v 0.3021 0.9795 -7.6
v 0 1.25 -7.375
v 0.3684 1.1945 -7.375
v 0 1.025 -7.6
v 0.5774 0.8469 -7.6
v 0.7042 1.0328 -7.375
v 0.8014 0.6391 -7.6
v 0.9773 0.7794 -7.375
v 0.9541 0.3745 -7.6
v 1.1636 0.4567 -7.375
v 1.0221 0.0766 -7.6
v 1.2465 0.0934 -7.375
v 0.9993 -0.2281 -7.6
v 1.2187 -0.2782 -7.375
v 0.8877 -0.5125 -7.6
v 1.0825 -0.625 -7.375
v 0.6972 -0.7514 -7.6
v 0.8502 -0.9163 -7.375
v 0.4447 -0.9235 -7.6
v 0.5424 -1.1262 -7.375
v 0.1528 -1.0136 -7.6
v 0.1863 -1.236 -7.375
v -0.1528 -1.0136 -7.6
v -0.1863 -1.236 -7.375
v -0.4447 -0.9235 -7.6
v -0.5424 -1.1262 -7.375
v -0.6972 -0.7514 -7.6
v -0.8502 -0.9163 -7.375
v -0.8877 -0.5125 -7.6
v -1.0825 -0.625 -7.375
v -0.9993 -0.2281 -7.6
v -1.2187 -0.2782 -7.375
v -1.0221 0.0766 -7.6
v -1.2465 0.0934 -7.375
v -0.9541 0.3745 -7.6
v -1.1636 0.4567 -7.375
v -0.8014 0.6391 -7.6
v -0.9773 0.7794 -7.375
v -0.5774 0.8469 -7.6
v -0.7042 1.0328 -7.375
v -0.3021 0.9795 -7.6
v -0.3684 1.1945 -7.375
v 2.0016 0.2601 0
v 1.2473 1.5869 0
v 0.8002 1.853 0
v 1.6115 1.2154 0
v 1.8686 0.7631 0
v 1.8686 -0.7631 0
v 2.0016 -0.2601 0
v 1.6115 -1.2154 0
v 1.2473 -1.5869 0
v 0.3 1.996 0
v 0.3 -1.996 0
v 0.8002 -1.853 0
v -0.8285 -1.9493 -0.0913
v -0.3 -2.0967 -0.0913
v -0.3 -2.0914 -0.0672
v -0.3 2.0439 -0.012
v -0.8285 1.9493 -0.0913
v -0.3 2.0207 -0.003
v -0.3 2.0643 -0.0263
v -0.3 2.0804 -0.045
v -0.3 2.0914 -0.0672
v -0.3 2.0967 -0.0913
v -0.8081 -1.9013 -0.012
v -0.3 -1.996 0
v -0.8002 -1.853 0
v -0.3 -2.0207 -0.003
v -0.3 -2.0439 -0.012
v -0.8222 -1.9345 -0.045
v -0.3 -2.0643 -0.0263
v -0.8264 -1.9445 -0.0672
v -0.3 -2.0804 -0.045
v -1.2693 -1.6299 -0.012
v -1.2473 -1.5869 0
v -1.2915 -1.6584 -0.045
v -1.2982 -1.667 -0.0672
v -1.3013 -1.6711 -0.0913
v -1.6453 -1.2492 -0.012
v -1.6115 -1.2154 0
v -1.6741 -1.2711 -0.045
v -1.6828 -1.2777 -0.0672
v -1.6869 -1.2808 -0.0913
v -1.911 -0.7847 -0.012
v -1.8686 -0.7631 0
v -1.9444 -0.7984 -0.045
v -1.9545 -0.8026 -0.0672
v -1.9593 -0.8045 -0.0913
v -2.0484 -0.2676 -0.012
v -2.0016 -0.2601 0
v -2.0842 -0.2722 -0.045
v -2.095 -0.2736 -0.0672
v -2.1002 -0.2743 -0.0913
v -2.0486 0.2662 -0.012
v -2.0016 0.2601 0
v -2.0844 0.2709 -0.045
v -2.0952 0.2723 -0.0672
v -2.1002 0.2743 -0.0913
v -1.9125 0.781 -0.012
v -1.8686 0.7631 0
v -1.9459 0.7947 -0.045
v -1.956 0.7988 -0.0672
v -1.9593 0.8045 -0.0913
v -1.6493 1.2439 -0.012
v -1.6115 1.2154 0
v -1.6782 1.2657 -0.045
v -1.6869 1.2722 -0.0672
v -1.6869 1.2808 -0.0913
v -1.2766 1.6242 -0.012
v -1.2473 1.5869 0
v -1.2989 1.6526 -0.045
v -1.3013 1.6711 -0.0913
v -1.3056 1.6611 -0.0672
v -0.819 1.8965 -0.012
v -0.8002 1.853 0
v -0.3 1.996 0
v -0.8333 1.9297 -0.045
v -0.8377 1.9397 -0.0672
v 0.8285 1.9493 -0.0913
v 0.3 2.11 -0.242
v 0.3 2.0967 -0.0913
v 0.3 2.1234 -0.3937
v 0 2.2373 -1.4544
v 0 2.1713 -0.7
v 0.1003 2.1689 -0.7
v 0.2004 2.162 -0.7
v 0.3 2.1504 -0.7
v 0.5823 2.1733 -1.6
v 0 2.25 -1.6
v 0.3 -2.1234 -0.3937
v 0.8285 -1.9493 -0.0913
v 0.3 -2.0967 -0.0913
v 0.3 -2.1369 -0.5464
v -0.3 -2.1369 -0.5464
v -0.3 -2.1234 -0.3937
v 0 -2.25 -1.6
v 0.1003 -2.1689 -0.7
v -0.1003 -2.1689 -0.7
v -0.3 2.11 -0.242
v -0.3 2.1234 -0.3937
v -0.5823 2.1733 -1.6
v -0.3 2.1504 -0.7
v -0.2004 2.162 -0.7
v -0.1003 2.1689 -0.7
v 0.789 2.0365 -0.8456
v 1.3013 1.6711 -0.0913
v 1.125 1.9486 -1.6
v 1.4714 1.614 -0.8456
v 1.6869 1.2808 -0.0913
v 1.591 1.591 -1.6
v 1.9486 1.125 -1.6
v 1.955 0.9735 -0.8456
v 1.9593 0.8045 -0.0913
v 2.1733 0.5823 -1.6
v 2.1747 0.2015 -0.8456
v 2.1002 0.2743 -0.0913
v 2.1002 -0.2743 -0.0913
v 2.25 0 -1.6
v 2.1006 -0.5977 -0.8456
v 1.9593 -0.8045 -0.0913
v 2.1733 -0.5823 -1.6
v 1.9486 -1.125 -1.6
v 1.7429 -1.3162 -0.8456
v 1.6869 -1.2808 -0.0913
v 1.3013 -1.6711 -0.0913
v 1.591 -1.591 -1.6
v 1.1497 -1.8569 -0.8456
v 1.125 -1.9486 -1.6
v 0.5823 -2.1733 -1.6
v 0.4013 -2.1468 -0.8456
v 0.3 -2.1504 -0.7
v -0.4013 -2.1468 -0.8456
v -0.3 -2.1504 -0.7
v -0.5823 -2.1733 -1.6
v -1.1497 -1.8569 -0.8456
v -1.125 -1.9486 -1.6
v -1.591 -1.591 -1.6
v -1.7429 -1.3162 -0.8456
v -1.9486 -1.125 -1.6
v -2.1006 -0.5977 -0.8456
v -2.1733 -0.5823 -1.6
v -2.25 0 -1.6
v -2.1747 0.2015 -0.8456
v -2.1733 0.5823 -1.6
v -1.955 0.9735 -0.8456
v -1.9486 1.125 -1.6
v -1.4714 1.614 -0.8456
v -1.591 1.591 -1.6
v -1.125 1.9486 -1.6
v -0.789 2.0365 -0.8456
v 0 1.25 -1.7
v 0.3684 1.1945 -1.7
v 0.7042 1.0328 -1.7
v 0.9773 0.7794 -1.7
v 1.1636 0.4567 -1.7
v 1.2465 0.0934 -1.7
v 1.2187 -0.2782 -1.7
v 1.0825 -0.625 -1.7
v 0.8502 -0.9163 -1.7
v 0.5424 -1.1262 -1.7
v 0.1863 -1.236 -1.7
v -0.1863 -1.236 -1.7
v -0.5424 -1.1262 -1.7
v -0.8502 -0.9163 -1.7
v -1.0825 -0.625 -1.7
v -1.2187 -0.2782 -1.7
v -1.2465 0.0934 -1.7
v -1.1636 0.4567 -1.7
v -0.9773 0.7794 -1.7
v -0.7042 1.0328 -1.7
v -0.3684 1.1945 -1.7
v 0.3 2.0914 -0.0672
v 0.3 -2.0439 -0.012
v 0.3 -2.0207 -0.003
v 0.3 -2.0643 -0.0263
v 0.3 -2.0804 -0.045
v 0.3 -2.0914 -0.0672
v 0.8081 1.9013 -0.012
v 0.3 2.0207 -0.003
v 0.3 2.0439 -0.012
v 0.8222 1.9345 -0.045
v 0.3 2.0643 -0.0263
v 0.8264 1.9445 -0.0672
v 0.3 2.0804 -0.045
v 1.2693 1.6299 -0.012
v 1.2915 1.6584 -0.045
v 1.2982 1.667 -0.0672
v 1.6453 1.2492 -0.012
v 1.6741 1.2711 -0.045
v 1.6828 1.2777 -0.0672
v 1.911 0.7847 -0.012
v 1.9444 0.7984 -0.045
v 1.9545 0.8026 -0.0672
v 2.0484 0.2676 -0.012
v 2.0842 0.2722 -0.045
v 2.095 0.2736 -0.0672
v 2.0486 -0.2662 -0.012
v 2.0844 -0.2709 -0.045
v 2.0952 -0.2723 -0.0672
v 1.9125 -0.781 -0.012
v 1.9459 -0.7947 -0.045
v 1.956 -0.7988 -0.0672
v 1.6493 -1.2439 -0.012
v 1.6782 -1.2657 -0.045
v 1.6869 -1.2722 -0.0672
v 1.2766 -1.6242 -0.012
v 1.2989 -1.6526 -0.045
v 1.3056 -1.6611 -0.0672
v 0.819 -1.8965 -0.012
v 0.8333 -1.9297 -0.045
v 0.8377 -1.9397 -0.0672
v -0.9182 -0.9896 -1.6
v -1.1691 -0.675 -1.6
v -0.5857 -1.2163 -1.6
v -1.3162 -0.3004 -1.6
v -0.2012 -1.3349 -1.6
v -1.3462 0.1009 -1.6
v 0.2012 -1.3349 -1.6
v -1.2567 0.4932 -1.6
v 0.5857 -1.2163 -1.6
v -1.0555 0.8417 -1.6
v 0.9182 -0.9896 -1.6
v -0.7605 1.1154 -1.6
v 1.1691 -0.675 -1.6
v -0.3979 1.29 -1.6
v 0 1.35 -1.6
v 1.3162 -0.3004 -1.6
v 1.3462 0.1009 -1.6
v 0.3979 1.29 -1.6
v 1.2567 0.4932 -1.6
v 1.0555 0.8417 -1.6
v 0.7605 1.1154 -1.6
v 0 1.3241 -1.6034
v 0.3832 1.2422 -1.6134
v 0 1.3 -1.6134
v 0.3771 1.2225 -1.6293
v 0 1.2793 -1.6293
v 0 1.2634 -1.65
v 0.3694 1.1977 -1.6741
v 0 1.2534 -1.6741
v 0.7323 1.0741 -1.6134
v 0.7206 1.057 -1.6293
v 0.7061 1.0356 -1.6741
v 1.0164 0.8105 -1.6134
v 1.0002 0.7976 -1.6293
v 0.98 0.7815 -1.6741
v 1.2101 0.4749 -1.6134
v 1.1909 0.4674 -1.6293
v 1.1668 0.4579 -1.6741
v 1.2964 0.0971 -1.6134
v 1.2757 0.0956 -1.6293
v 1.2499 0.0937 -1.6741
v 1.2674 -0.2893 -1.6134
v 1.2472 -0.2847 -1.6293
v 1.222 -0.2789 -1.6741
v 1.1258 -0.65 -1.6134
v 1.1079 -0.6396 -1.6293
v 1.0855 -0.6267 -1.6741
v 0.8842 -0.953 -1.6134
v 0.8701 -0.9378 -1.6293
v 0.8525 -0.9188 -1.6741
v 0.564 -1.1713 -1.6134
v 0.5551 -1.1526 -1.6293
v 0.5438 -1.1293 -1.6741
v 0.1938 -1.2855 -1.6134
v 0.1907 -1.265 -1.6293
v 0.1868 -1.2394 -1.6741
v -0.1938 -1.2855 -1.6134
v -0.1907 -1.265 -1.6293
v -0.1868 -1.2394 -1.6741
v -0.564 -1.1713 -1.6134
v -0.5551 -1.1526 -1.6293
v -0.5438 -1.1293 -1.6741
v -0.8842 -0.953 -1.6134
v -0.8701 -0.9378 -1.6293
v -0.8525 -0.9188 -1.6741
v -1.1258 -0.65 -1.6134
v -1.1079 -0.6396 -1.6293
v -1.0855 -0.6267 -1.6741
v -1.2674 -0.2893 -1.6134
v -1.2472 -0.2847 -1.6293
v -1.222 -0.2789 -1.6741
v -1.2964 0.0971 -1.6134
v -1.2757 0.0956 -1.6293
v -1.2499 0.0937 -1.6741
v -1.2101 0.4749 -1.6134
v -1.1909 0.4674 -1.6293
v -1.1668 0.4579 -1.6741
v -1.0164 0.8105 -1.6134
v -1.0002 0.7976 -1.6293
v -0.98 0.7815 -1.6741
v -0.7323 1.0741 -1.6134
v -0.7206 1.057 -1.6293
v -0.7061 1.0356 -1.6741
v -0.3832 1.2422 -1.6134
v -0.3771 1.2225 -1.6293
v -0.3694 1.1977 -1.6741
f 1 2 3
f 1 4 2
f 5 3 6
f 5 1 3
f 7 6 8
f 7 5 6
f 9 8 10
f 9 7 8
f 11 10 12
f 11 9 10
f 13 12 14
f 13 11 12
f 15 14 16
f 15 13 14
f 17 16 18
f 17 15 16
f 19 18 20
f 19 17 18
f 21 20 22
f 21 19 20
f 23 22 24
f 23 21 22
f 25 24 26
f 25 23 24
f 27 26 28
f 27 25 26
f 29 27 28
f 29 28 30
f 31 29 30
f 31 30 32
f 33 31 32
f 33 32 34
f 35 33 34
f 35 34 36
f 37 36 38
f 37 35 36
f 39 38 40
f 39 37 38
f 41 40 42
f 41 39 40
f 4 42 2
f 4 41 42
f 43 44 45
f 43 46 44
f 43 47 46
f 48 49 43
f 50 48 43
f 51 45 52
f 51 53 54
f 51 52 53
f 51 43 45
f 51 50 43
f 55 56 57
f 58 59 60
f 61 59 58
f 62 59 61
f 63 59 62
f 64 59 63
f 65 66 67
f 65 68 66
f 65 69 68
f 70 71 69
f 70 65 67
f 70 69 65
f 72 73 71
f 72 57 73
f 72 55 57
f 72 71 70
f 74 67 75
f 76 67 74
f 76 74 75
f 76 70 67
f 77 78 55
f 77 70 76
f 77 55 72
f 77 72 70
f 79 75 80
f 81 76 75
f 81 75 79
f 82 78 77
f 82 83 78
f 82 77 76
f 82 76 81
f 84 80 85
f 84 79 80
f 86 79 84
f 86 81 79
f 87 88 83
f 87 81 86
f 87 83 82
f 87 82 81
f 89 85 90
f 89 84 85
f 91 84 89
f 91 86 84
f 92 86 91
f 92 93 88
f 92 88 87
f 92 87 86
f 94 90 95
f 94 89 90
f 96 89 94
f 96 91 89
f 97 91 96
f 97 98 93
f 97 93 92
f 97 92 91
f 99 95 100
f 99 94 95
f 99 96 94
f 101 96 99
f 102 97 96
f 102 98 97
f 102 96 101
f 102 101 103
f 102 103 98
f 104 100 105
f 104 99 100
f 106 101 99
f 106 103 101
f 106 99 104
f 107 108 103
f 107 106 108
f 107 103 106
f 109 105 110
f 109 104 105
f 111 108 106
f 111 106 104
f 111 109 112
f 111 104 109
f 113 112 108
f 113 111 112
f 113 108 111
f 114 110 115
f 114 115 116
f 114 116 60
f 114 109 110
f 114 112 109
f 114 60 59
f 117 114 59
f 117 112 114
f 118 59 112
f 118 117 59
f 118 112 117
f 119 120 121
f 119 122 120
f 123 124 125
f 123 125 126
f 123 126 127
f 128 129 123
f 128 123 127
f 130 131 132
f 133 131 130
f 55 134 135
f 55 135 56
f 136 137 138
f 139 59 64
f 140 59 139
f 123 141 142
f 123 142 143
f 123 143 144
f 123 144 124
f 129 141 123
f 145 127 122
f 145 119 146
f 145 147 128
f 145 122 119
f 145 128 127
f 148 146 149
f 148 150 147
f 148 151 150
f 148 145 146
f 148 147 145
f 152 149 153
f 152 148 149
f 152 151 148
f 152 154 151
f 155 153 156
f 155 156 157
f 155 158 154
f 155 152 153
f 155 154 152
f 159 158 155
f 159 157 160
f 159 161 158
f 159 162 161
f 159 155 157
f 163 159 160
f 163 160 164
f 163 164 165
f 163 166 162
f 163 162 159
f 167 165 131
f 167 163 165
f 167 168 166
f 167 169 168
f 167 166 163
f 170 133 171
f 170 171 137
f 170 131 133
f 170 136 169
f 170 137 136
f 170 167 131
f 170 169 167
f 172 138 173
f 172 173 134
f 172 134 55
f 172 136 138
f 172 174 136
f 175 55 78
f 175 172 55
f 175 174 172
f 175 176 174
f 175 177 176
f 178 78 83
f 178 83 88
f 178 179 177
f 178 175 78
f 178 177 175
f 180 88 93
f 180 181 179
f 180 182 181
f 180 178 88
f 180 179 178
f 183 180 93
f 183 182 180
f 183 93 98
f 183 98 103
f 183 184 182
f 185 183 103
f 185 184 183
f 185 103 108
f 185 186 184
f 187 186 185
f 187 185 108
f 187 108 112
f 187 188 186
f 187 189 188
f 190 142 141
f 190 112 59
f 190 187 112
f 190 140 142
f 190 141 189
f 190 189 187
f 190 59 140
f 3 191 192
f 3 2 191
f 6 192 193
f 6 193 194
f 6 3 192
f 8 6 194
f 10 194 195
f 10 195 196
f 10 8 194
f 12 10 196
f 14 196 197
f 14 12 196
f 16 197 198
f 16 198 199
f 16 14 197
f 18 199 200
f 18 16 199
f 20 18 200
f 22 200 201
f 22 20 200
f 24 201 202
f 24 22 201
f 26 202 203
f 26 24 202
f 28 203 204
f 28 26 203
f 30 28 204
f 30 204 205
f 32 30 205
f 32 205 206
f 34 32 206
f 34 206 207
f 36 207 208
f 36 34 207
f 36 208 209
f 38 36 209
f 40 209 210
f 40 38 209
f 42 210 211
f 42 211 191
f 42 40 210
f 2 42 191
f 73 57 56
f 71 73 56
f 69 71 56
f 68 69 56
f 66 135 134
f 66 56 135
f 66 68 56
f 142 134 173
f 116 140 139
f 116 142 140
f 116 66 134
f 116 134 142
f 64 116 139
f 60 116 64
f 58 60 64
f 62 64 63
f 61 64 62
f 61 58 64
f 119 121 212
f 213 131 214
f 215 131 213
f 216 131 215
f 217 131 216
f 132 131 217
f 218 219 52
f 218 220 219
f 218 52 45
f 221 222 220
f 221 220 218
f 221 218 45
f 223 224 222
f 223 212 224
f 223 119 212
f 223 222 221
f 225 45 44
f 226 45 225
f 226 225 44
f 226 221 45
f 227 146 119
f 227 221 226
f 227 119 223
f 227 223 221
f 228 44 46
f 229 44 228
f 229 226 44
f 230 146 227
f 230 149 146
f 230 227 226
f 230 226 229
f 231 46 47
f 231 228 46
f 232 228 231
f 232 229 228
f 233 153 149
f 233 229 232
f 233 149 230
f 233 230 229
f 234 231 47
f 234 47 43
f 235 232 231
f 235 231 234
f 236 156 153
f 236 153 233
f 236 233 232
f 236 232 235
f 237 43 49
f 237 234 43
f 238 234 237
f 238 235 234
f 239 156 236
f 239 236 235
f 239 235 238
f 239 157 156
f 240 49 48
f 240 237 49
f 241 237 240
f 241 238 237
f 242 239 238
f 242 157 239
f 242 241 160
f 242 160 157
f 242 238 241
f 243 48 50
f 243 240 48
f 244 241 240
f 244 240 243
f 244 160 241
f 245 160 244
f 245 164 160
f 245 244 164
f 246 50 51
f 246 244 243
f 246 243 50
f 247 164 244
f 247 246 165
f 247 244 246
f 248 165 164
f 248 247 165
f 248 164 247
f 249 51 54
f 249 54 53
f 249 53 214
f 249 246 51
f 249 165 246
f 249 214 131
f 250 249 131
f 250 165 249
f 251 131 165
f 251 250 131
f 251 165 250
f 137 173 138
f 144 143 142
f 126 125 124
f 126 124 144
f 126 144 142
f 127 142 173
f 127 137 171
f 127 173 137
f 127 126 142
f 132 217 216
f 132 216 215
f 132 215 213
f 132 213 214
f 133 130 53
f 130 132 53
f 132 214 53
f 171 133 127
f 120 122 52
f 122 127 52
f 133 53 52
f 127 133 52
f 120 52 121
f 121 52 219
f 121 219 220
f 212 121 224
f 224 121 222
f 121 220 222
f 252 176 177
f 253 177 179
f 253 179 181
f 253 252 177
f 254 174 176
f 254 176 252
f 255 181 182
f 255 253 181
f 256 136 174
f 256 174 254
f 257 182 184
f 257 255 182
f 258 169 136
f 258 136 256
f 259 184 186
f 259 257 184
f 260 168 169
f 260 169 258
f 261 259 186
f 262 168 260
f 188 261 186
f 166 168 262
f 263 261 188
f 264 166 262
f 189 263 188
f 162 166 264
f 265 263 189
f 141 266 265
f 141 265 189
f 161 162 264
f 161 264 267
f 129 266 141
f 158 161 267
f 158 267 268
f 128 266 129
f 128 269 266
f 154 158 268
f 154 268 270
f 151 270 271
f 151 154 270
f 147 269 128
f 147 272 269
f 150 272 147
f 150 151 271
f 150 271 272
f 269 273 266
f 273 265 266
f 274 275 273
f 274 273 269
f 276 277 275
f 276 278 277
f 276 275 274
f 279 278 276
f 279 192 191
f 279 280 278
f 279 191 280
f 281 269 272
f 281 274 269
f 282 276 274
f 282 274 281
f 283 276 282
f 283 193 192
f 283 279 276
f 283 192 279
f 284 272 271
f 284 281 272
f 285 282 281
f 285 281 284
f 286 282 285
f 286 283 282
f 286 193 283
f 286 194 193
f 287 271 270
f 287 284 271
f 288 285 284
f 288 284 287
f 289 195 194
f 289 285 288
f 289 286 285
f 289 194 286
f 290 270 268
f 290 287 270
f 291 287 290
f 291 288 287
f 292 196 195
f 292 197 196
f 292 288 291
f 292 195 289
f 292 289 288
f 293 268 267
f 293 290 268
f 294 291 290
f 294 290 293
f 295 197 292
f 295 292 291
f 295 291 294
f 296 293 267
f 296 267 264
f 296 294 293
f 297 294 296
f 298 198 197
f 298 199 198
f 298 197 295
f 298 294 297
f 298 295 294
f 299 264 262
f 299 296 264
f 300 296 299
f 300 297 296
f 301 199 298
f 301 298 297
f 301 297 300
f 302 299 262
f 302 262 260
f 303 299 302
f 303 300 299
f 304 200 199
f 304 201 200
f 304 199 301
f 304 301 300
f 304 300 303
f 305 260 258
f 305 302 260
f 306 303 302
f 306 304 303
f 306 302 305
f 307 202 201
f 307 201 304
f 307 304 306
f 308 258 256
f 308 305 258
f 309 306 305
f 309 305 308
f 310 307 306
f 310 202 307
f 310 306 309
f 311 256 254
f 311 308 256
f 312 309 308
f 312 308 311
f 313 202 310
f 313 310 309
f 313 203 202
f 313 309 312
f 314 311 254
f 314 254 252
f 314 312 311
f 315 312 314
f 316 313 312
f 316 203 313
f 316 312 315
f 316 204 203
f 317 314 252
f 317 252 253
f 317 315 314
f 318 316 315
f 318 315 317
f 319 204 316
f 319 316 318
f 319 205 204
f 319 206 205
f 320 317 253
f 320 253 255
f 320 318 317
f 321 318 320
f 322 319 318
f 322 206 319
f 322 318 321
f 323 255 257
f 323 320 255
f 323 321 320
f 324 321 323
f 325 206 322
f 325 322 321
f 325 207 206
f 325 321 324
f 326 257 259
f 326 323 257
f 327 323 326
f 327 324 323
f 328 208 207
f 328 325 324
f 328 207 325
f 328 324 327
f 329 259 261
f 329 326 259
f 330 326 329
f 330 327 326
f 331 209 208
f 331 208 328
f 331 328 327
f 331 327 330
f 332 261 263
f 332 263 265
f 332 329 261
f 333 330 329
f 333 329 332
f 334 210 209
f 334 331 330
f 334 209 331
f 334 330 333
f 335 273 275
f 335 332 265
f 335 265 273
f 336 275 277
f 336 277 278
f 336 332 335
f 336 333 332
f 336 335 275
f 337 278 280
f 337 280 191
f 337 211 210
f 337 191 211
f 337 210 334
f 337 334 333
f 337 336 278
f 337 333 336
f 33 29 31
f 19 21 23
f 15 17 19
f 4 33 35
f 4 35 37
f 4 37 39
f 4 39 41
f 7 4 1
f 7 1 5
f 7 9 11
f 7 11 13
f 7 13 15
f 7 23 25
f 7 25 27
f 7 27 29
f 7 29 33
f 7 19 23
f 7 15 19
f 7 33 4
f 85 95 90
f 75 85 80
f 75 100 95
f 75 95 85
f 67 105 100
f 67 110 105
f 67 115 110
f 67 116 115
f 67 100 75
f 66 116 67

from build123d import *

# Parameters (mm, degrees)
SKETCH2_W          = 0.6
SKETCH2_H          = 4.5
CUT_EXTRUDE1_DEPTH = 0.7


with BuildPart() as part:
    # Sketch1 → Revolve1 (revolve)
    with BuildSketch(Plane(origin=(0, 0, 0), x_dir=(0, 0, -1), z_dir=(1, 0, 0))):
        with BuildLine():
            Line((0, 0), (0, 2.018385021))
            ThreePointArc((0, 2.018385021), (0.026272266, 2.085944042), (0.091284426, 2.118004491))
            Line((0.091284426, 2.118004491), (1.6, 2.25))
            Line((1.6, 2.25), (1.6, 1.35))
            ThreePointArc((1.6, 1.35), (1.629289322, 1.279289322), (1.7, 1.25))
            Line((1.7, 1.25), (7.375, 1.25))
            Line((7.375, 1.25), (7.6, 1.025))
            Line((7.6, 1.025), (7.6, 0))
            Line((7.6, 0), (0, 0))
        make_face()
    revolve(axis=Axis((0, 0, 0), (0, 0, -1)))

    # Sketch2 → Cut-Extrude1 (cut)
    with BuildSketch(Plane.XY):
        Rectangle(SKETCH2_W, SKETCH2_H)
    extrude(amount=-CUT_EXTRUDE1_DEPTH, mode=Mode.SUBTRACT)


solid = part.part
